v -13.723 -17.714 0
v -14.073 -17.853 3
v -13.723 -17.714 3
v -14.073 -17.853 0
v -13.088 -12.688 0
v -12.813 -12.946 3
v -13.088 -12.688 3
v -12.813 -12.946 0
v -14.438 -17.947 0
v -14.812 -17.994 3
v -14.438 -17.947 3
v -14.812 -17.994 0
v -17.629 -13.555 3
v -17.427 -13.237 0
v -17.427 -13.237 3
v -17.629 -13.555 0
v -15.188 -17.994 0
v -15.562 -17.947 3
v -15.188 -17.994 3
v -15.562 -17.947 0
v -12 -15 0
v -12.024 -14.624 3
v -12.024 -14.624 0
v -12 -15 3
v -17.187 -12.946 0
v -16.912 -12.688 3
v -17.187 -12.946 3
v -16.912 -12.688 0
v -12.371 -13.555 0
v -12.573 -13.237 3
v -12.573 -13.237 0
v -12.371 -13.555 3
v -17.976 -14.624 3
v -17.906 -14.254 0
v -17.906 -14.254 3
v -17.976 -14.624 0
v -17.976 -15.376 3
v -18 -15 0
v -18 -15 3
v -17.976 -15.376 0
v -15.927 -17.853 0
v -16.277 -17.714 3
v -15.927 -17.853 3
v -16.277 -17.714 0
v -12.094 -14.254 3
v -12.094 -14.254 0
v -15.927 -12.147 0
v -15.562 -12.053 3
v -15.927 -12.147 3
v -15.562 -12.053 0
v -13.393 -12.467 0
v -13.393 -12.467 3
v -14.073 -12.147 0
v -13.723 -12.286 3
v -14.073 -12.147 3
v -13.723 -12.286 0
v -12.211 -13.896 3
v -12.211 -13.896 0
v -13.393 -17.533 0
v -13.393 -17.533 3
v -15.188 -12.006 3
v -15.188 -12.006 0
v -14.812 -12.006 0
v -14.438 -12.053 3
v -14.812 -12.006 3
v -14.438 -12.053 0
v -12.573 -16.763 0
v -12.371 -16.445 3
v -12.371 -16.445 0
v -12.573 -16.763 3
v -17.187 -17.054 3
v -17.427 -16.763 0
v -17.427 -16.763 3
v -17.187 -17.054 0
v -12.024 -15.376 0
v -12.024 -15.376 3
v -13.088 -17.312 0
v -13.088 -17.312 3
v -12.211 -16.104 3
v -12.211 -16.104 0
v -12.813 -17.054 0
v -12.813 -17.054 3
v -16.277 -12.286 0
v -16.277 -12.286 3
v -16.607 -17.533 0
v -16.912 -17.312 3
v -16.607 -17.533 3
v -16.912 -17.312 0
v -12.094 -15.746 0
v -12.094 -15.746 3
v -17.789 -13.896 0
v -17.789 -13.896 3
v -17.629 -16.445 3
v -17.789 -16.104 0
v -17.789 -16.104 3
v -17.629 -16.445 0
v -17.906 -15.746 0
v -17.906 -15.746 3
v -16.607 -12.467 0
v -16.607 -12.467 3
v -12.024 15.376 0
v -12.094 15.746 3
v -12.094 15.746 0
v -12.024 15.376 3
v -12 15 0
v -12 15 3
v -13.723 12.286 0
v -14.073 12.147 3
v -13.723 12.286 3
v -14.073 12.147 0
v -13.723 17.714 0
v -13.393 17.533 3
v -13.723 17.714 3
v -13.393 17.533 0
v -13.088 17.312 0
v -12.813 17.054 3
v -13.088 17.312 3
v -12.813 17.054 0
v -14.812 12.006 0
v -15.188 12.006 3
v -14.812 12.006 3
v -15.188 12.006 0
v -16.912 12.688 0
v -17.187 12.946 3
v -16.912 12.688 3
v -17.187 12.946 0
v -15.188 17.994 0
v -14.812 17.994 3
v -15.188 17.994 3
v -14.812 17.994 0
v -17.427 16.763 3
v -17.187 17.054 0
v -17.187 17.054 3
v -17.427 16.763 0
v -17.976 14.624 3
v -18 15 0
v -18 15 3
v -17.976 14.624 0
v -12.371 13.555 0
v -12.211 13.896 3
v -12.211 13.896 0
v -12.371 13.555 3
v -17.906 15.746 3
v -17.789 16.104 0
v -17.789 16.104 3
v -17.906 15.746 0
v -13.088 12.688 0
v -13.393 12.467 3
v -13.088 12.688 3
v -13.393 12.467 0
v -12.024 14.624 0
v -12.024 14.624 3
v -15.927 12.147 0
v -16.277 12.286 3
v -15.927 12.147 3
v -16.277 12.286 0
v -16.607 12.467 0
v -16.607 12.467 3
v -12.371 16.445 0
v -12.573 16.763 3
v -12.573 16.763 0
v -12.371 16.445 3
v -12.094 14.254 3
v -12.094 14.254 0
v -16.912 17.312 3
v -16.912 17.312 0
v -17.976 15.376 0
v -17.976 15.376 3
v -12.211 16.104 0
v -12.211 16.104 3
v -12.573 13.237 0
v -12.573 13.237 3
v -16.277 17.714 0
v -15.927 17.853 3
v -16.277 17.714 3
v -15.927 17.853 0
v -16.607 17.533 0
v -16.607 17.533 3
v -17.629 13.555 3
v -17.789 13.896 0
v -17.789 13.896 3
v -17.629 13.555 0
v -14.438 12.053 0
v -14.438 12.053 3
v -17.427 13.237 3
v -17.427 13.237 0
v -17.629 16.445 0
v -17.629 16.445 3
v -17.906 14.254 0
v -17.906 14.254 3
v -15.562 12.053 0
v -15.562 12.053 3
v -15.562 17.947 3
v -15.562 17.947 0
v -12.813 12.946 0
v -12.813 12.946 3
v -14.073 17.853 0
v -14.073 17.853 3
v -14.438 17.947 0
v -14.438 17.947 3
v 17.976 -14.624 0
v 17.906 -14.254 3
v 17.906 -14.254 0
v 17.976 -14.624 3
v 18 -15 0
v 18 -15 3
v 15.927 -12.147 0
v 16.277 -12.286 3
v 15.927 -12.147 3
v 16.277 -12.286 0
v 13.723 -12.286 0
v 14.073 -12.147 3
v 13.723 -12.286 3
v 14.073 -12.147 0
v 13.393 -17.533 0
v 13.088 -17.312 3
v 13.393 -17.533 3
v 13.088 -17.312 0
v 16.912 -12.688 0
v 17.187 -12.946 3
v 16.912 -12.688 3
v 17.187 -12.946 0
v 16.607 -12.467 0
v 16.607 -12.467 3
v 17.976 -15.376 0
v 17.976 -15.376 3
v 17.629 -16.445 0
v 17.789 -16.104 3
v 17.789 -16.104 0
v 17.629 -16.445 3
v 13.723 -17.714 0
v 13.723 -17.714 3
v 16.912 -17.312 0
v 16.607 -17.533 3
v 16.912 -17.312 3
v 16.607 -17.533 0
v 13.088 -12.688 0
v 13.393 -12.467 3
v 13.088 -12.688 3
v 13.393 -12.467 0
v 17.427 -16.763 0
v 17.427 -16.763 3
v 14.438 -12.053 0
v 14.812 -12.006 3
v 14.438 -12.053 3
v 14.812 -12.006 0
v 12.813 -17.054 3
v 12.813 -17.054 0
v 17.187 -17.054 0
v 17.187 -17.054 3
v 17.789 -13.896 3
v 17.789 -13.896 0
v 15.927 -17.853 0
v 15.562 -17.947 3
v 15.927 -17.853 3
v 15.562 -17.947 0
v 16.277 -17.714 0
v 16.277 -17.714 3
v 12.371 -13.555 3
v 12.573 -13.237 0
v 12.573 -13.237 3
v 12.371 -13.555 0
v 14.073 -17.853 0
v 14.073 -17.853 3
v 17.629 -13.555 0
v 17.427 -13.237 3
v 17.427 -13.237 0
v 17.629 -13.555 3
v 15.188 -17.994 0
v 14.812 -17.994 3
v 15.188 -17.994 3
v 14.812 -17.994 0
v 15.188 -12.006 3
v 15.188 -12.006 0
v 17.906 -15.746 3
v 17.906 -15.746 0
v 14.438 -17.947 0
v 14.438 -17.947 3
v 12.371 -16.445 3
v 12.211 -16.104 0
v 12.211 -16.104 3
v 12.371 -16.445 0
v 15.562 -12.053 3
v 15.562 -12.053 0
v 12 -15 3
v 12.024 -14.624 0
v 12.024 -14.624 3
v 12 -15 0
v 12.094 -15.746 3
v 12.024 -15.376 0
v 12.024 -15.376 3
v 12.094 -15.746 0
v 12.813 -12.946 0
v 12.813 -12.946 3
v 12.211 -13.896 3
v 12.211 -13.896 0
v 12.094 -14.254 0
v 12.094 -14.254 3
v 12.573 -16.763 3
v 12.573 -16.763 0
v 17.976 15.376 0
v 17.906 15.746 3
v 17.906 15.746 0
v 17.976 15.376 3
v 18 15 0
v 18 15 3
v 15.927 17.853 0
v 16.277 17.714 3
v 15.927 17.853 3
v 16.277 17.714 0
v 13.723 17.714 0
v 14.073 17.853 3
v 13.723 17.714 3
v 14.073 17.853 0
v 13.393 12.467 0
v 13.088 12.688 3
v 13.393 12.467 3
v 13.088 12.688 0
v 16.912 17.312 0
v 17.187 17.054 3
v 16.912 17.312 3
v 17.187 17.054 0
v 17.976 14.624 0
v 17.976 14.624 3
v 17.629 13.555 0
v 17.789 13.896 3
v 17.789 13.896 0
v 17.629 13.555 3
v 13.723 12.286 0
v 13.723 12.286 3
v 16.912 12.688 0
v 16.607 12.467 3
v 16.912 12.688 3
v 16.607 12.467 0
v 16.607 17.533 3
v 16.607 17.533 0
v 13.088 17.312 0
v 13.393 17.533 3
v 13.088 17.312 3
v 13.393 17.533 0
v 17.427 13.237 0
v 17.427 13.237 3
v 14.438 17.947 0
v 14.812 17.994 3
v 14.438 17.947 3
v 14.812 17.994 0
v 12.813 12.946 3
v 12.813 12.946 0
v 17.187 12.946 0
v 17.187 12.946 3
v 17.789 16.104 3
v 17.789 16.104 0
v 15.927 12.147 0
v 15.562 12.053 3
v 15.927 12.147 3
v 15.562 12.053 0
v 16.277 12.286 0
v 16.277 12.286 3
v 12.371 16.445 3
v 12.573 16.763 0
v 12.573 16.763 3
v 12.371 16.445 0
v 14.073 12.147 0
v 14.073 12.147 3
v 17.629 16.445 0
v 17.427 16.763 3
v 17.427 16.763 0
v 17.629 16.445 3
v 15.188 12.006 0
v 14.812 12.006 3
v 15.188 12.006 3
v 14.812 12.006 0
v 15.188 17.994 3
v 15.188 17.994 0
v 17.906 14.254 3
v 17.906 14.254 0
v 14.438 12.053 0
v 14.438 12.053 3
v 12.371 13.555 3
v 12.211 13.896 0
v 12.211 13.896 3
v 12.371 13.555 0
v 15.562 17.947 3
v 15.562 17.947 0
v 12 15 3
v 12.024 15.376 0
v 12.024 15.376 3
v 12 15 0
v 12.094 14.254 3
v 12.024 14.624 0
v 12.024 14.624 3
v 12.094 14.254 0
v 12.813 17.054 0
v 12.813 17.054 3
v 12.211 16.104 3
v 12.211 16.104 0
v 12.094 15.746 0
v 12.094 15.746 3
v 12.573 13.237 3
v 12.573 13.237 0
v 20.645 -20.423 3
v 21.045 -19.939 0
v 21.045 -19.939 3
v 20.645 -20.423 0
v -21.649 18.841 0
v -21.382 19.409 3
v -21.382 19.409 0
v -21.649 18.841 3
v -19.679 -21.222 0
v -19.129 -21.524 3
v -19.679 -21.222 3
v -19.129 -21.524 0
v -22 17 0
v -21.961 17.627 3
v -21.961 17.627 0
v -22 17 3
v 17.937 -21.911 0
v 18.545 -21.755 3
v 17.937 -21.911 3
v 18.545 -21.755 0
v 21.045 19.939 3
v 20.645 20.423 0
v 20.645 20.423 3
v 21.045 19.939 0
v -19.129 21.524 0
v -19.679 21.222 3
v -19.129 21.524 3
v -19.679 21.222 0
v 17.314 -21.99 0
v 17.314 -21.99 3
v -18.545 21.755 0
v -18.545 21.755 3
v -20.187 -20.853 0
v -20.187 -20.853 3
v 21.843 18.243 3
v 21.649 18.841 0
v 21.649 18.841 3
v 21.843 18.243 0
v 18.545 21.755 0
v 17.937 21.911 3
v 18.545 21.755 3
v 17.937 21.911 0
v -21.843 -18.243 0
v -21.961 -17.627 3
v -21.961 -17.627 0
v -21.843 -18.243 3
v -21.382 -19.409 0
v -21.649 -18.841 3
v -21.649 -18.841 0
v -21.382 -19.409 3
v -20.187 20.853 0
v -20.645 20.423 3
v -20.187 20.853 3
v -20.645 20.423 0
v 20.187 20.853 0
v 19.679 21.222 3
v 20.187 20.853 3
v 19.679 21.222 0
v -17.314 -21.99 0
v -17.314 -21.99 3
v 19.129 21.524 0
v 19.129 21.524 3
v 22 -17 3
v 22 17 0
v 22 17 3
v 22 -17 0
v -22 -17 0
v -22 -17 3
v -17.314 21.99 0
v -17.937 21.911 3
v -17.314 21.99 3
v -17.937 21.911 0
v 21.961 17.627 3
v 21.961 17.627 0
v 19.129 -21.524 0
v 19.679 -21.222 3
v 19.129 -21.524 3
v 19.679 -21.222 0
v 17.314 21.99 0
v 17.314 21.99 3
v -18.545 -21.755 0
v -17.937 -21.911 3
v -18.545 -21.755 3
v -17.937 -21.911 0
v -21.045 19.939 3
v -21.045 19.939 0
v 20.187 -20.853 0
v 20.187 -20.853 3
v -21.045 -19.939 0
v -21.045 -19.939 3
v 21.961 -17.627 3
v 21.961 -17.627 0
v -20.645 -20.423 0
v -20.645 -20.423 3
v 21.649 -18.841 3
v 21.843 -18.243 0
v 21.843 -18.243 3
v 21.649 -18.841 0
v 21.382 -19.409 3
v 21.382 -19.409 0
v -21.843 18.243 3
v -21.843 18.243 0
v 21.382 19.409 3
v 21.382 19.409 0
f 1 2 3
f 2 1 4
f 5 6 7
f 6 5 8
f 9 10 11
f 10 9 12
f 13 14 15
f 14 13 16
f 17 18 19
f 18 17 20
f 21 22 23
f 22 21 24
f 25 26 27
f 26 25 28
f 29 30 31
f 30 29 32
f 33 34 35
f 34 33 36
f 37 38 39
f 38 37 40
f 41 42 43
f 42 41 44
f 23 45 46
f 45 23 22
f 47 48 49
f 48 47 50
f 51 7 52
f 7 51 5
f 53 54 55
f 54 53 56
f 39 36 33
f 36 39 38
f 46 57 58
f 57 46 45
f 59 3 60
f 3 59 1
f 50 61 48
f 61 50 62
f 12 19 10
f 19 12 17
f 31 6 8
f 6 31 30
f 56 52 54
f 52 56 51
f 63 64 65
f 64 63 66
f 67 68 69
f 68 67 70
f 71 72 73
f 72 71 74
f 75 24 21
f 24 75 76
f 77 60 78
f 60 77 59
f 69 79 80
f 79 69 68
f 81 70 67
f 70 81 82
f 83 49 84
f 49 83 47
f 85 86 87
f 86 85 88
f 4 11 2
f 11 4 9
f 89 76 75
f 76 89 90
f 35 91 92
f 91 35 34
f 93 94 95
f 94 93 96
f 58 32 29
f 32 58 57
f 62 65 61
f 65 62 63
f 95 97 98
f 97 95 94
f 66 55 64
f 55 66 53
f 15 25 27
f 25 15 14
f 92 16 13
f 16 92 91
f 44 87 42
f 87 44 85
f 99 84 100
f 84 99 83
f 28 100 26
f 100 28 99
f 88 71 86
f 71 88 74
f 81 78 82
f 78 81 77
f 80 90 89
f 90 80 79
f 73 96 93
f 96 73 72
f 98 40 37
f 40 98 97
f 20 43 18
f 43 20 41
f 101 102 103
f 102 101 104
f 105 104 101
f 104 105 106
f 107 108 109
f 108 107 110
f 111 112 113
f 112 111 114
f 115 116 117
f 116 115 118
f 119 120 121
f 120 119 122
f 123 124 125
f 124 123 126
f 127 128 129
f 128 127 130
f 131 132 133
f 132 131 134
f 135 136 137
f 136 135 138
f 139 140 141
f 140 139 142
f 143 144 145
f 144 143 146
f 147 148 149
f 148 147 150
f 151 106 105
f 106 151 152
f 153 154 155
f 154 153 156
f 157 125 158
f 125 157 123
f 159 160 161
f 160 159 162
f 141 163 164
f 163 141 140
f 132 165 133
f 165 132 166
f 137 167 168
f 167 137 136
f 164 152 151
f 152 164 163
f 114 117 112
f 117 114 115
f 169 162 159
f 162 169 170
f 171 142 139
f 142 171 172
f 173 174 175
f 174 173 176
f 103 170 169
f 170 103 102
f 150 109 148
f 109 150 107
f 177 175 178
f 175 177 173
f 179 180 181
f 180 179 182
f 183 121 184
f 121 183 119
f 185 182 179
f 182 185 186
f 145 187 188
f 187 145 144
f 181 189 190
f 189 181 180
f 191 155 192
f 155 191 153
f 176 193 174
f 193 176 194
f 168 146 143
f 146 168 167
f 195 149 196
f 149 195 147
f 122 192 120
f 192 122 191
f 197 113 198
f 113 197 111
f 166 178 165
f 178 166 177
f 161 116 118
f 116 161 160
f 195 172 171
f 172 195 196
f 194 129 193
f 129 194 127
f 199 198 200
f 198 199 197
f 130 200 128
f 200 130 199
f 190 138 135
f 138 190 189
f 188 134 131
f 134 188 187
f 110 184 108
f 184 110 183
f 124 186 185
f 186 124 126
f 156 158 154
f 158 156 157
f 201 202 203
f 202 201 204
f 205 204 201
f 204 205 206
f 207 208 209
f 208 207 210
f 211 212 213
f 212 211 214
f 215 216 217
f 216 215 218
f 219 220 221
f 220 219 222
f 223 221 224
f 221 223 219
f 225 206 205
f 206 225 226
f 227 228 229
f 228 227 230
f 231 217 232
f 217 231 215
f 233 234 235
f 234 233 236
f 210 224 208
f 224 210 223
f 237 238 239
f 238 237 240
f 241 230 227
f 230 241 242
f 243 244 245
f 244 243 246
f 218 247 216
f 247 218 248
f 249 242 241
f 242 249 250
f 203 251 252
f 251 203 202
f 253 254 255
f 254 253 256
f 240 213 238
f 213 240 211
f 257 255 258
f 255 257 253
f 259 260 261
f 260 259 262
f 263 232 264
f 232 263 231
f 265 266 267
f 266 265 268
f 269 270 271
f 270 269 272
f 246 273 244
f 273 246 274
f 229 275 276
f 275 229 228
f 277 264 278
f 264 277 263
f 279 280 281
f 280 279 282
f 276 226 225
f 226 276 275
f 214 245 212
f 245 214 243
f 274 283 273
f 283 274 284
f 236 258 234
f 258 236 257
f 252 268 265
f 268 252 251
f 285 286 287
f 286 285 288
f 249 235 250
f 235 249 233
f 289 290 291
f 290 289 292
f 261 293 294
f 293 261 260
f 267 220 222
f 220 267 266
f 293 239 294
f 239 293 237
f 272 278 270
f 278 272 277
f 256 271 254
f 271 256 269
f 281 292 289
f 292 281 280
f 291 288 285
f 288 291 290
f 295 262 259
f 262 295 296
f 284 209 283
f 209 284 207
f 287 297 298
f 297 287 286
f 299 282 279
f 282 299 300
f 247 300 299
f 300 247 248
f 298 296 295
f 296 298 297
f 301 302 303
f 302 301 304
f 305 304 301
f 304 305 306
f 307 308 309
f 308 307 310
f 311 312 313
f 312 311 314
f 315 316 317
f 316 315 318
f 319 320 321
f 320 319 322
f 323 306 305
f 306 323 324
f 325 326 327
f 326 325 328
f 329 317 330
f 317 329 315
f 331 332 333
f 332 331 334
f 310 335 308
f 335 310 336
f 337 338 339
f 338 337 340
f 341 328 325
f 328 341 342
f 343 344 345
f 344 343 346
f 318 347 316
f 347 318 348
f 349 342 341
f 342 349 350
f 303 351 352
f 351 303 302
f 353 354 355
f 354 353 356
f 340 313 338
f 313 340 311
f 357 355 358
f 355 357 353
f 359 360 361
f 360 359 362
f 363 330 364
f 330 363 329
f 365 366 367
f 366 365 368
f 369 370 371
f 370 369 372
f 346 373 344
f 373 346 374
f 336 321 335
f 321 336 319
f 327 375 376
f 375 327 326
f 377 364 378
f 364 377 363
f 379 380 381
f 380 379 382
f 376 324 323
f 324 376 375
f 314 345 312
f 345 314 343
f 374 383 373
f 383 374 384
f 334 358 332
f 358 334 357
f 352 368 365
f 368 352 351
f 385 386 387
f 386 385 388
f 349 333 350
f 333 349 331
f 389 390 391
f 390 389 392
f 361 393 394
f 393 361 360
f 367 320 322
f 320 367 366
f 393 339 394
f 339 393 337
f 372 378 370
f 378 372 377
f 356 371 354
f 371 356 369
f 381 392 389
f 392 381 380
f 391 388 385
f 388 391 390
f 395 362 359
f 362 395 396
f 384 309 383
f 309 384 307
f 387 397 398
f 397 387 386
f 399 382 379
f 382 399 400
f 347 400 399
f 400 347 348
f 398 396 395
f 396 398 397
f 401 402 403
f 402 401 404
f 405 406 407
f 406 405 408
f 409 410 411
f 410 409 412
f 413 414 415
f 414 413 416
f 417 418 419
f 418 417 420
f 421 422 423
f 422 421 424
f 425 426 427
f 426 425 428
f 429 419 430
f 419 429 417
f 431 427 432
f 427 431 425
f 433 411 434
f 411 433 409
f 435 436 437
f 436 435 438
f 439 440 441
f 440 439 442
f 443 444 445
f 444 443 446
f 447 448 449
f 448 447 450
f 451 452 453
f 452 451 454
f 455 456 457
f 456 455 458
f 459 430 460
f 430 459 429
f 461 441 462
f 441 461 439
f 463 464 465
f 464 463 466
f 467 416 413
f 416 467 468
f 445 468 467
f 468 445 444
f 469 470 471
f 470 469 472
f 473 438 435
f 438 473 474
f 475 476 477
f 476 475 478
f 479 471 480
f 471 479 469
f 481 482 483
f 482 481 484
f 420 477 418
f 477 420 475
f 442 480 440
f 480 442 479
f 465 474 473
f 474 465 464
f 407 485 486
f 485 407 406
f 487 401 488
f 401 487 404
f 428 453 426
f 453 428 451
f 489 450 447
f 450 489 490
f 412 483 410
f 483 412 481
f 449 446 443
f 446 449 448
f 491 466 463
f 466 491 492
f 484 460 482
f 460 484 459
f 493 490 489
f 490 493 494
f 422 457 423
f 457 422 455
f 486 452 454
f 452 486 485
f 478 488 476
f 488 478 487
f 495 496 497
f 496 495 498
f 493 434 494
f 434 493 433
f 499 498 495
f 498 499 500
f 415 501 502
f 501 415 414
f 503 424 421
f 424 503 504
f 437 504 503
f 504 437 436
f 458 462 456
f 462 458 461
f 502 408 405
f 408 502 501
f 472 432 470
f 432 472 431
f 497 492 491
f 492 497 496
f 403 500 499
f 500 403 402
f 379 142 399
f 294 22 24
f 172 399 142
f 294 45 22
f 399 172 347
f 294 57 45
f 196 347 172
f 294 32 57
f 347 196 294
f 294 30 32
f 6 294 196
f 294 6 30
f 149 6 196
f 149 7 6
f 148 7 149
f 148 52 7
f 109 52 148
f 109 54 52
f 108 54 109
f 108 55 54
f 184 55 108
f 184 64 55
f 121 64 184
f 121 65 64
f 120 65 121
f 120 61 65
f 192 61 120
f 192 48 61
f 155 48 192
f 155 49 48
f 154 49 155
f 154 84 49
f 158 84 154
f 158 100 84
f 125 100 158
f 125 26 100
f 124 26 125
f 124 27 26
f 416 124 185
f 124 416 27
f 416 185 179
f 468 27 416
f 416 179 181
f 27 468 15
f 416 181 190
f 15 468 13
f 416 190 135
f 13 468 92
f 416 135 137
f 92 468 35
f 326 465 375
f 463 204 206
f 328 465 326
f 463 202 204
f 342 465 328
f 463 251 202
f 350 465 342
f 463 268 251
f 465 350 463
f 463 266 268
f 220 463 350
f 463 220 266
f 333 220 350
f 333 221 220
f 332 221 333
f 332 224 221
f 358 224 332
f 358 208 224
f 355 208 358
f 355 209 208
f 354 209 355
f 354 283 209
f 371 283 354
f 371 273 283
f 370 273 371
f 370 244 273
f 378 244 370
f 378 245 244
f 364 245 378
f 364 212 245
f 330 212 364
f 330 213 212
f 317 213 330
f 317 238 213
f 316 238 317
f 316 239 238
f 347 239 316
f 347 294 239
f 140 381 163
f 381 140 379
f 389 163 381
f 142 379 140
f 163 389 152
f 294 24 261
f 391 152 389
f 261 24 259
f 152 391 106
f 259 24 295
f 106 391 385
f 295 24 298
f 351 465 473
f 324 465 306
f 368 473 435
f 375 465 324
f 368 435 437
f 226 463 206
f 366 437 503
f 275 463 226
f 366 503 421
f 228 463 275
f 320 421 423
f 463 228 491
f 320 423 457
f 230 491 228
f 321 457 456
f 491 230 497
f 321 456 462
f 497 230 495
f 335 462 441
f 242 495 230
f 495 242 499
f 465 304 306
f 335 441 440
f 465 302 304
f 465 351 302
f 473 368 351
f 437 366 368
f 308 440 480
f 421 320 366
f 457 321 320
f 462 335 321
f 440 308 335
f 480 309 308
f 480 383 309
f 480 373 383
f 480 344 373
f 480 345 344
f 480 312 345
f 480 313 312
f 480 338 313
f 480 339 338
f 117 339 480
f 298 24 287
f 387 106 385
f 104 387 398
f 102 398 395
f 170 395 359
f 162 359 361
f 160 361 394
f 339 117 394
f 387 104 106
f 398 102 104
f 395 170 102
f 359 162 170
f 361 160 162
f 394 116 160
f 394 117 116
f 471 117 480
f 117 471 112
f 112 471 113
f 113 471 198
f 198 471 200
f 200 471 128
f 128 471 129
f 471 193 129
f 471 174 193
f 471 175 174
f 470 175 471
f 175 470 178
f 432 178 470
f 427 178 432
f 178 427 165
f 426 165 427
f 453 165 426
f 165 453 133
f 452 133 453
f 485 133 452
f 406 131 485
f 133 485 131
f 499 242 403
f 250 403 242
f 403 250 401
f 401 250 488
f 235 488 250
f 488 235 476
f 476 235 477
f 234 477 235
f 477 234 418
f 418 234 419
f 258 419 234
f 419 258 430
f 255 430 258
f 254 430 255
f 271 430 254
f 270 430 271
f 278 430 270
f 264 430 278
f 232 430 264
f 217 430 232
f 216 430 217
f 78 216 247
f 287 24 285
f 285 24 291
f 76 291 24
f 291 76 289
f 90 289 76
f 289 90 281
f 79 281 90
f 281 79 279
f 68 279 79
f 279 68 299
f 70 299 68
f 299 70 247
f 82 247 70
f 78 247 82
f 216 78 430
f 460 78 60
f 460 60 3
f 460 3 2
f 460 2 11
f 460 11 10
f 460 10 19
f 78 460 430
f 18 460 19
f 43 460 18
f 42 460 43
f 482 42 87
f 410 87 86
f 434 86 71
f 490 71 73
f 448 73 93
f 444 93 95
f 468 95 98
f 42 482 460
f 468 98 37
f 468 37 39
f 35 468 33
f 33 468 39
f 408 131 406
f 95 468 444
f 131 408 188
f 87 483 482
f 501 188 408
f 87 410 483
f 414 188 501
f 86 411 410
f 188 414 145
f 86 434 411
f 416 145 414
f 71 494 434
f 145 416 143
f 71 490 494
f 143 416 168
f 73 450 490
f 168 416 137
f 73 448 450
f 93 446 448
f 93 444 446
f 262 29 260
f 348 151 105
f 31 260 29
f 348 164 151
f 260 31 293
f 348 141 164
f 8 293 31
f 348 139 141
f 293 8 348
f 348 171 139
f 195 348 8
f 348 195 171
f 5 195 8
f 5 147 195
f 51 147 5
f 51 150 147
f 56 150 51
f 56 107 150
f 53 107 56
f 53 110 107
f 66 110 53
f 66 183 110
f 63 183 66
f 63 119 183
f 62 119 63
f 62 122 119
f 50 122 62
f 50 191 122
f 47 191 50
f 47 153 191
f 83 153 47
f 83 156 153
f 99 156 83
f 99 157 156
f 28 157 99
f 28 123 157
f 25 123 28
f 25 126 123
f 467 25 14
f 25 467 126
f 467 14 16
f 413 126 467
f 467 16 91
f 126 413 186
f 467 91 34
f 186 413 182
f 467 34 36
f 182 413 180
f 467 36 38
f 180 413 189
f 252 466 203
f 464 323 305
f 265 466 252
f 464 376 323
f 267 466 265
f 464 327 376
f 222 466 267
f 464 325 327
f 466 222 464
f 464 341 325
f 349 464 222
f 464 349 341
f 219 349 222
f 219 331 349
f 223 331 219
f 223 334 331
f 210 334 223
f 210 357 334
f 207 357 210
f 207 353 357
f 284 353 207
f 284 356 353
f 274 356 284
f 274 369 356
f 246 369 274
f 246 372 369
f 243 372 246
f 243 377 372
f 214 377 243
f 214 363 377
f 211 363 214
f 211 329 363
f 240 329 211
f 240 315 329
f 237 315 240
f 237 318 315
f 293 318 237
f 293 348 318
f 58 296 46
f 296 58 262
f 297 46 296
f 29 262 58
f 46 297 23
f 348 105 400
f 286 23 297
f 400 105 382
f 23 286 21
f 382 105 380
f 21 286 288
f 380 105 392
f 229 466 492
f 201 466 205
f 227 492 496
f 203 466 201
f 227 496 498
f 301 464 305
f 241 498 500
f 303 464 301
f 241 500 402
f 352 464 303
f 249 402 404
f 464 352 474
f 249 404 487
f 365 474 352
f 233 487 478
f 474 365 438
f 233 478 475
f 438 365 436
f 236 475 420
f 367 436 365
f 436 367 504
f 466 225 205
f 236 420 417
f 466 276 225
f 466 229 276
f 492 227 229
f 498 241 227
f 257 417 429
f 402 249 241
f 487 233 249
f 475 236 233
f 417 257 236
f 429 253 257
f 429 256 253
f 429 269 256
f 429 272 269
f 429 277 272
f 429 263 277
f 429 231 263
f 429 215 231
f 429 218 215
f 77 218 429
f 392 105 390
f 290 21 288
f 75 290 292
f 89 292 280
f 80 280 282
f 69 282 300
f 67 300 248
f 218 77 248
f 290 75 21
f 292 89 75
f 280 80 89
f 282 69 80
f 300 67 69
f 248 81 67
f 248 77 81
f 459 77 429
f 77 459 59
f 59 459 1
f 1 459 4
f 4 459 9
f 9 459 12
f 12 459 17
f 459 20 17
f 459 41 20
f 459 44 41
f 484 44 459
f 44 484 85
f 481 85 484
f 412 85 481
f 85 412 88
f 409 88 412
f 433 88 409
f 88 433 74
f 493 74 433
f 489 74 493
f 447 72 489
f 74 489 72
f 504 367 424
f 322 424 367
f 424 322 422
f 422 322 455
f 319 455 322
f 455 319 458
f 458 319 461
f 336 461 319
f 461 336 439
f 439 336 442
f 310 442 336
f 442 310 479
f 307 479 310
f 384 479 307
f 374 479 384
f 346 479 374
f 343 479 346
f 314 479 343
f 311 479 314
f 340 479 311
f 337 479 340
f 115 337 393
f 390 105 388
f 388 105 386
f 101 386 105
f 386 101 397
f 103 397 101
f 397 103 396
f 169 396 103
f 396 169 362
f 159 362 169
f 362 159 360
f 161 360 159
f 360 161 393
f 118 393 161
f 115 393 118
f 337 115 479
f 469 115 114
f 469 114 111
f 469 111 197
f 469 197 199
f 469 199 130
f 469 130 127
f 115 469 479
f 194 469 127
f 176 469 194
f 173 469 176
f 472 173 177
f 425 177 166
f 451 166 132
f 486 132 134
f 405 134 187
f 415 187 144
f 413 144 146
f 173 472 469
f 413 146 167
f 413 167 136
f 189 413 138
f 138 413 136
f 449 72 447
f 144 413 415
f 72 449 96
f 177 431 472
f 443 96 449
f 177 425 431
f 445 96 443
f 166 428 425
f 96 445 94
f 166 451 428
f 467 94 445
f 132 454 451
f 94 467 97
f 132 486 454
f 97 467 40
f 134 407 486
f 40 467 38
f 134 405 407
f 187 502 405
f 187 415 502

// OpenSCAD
$fn = 50;


difference() {
	union() {
		hull() {
			translate(v = [-17.0000000000, 17.0000000000, 0]) {
				cylinder(h = 3, r = 5);
			}
			translate(v = [17.0000000000, 17.0000000000, 0]) {
				cylinder(h = 3, r = 5);
			}
			translate(v = [-17.0000000000, -17.0000000000, 0]) {
				cylinder(h = 3, r = 5);
			}
			translate(v = [17.0000000000, -17.0000000000, 0]) {
				cylinder(h = 3, r = 5);
			}
		}
	}
	union() {
		translate(v = [-15.0000000000, -15.0000000000, -100.0000000000]) {
			cylinder(h = 200, r = 3.0000000000);
		}
		translate(v = [-15.0000000000, 15.0000000000, -100.0000000000]) {
			cylinder(h = 200, r = 3.0000000000);
		}
		translate(v = [15.0000000000, -15.0000000000, -100.0000000000]) {
			cylinder(h = 200, r = 3.0000000000);
		}
		translate(v = [15.0000000000, 15.0000000000, -100.0000000000]) {
			cylinder(h = 200, r = 3.0000000000);
		}
	}
}
